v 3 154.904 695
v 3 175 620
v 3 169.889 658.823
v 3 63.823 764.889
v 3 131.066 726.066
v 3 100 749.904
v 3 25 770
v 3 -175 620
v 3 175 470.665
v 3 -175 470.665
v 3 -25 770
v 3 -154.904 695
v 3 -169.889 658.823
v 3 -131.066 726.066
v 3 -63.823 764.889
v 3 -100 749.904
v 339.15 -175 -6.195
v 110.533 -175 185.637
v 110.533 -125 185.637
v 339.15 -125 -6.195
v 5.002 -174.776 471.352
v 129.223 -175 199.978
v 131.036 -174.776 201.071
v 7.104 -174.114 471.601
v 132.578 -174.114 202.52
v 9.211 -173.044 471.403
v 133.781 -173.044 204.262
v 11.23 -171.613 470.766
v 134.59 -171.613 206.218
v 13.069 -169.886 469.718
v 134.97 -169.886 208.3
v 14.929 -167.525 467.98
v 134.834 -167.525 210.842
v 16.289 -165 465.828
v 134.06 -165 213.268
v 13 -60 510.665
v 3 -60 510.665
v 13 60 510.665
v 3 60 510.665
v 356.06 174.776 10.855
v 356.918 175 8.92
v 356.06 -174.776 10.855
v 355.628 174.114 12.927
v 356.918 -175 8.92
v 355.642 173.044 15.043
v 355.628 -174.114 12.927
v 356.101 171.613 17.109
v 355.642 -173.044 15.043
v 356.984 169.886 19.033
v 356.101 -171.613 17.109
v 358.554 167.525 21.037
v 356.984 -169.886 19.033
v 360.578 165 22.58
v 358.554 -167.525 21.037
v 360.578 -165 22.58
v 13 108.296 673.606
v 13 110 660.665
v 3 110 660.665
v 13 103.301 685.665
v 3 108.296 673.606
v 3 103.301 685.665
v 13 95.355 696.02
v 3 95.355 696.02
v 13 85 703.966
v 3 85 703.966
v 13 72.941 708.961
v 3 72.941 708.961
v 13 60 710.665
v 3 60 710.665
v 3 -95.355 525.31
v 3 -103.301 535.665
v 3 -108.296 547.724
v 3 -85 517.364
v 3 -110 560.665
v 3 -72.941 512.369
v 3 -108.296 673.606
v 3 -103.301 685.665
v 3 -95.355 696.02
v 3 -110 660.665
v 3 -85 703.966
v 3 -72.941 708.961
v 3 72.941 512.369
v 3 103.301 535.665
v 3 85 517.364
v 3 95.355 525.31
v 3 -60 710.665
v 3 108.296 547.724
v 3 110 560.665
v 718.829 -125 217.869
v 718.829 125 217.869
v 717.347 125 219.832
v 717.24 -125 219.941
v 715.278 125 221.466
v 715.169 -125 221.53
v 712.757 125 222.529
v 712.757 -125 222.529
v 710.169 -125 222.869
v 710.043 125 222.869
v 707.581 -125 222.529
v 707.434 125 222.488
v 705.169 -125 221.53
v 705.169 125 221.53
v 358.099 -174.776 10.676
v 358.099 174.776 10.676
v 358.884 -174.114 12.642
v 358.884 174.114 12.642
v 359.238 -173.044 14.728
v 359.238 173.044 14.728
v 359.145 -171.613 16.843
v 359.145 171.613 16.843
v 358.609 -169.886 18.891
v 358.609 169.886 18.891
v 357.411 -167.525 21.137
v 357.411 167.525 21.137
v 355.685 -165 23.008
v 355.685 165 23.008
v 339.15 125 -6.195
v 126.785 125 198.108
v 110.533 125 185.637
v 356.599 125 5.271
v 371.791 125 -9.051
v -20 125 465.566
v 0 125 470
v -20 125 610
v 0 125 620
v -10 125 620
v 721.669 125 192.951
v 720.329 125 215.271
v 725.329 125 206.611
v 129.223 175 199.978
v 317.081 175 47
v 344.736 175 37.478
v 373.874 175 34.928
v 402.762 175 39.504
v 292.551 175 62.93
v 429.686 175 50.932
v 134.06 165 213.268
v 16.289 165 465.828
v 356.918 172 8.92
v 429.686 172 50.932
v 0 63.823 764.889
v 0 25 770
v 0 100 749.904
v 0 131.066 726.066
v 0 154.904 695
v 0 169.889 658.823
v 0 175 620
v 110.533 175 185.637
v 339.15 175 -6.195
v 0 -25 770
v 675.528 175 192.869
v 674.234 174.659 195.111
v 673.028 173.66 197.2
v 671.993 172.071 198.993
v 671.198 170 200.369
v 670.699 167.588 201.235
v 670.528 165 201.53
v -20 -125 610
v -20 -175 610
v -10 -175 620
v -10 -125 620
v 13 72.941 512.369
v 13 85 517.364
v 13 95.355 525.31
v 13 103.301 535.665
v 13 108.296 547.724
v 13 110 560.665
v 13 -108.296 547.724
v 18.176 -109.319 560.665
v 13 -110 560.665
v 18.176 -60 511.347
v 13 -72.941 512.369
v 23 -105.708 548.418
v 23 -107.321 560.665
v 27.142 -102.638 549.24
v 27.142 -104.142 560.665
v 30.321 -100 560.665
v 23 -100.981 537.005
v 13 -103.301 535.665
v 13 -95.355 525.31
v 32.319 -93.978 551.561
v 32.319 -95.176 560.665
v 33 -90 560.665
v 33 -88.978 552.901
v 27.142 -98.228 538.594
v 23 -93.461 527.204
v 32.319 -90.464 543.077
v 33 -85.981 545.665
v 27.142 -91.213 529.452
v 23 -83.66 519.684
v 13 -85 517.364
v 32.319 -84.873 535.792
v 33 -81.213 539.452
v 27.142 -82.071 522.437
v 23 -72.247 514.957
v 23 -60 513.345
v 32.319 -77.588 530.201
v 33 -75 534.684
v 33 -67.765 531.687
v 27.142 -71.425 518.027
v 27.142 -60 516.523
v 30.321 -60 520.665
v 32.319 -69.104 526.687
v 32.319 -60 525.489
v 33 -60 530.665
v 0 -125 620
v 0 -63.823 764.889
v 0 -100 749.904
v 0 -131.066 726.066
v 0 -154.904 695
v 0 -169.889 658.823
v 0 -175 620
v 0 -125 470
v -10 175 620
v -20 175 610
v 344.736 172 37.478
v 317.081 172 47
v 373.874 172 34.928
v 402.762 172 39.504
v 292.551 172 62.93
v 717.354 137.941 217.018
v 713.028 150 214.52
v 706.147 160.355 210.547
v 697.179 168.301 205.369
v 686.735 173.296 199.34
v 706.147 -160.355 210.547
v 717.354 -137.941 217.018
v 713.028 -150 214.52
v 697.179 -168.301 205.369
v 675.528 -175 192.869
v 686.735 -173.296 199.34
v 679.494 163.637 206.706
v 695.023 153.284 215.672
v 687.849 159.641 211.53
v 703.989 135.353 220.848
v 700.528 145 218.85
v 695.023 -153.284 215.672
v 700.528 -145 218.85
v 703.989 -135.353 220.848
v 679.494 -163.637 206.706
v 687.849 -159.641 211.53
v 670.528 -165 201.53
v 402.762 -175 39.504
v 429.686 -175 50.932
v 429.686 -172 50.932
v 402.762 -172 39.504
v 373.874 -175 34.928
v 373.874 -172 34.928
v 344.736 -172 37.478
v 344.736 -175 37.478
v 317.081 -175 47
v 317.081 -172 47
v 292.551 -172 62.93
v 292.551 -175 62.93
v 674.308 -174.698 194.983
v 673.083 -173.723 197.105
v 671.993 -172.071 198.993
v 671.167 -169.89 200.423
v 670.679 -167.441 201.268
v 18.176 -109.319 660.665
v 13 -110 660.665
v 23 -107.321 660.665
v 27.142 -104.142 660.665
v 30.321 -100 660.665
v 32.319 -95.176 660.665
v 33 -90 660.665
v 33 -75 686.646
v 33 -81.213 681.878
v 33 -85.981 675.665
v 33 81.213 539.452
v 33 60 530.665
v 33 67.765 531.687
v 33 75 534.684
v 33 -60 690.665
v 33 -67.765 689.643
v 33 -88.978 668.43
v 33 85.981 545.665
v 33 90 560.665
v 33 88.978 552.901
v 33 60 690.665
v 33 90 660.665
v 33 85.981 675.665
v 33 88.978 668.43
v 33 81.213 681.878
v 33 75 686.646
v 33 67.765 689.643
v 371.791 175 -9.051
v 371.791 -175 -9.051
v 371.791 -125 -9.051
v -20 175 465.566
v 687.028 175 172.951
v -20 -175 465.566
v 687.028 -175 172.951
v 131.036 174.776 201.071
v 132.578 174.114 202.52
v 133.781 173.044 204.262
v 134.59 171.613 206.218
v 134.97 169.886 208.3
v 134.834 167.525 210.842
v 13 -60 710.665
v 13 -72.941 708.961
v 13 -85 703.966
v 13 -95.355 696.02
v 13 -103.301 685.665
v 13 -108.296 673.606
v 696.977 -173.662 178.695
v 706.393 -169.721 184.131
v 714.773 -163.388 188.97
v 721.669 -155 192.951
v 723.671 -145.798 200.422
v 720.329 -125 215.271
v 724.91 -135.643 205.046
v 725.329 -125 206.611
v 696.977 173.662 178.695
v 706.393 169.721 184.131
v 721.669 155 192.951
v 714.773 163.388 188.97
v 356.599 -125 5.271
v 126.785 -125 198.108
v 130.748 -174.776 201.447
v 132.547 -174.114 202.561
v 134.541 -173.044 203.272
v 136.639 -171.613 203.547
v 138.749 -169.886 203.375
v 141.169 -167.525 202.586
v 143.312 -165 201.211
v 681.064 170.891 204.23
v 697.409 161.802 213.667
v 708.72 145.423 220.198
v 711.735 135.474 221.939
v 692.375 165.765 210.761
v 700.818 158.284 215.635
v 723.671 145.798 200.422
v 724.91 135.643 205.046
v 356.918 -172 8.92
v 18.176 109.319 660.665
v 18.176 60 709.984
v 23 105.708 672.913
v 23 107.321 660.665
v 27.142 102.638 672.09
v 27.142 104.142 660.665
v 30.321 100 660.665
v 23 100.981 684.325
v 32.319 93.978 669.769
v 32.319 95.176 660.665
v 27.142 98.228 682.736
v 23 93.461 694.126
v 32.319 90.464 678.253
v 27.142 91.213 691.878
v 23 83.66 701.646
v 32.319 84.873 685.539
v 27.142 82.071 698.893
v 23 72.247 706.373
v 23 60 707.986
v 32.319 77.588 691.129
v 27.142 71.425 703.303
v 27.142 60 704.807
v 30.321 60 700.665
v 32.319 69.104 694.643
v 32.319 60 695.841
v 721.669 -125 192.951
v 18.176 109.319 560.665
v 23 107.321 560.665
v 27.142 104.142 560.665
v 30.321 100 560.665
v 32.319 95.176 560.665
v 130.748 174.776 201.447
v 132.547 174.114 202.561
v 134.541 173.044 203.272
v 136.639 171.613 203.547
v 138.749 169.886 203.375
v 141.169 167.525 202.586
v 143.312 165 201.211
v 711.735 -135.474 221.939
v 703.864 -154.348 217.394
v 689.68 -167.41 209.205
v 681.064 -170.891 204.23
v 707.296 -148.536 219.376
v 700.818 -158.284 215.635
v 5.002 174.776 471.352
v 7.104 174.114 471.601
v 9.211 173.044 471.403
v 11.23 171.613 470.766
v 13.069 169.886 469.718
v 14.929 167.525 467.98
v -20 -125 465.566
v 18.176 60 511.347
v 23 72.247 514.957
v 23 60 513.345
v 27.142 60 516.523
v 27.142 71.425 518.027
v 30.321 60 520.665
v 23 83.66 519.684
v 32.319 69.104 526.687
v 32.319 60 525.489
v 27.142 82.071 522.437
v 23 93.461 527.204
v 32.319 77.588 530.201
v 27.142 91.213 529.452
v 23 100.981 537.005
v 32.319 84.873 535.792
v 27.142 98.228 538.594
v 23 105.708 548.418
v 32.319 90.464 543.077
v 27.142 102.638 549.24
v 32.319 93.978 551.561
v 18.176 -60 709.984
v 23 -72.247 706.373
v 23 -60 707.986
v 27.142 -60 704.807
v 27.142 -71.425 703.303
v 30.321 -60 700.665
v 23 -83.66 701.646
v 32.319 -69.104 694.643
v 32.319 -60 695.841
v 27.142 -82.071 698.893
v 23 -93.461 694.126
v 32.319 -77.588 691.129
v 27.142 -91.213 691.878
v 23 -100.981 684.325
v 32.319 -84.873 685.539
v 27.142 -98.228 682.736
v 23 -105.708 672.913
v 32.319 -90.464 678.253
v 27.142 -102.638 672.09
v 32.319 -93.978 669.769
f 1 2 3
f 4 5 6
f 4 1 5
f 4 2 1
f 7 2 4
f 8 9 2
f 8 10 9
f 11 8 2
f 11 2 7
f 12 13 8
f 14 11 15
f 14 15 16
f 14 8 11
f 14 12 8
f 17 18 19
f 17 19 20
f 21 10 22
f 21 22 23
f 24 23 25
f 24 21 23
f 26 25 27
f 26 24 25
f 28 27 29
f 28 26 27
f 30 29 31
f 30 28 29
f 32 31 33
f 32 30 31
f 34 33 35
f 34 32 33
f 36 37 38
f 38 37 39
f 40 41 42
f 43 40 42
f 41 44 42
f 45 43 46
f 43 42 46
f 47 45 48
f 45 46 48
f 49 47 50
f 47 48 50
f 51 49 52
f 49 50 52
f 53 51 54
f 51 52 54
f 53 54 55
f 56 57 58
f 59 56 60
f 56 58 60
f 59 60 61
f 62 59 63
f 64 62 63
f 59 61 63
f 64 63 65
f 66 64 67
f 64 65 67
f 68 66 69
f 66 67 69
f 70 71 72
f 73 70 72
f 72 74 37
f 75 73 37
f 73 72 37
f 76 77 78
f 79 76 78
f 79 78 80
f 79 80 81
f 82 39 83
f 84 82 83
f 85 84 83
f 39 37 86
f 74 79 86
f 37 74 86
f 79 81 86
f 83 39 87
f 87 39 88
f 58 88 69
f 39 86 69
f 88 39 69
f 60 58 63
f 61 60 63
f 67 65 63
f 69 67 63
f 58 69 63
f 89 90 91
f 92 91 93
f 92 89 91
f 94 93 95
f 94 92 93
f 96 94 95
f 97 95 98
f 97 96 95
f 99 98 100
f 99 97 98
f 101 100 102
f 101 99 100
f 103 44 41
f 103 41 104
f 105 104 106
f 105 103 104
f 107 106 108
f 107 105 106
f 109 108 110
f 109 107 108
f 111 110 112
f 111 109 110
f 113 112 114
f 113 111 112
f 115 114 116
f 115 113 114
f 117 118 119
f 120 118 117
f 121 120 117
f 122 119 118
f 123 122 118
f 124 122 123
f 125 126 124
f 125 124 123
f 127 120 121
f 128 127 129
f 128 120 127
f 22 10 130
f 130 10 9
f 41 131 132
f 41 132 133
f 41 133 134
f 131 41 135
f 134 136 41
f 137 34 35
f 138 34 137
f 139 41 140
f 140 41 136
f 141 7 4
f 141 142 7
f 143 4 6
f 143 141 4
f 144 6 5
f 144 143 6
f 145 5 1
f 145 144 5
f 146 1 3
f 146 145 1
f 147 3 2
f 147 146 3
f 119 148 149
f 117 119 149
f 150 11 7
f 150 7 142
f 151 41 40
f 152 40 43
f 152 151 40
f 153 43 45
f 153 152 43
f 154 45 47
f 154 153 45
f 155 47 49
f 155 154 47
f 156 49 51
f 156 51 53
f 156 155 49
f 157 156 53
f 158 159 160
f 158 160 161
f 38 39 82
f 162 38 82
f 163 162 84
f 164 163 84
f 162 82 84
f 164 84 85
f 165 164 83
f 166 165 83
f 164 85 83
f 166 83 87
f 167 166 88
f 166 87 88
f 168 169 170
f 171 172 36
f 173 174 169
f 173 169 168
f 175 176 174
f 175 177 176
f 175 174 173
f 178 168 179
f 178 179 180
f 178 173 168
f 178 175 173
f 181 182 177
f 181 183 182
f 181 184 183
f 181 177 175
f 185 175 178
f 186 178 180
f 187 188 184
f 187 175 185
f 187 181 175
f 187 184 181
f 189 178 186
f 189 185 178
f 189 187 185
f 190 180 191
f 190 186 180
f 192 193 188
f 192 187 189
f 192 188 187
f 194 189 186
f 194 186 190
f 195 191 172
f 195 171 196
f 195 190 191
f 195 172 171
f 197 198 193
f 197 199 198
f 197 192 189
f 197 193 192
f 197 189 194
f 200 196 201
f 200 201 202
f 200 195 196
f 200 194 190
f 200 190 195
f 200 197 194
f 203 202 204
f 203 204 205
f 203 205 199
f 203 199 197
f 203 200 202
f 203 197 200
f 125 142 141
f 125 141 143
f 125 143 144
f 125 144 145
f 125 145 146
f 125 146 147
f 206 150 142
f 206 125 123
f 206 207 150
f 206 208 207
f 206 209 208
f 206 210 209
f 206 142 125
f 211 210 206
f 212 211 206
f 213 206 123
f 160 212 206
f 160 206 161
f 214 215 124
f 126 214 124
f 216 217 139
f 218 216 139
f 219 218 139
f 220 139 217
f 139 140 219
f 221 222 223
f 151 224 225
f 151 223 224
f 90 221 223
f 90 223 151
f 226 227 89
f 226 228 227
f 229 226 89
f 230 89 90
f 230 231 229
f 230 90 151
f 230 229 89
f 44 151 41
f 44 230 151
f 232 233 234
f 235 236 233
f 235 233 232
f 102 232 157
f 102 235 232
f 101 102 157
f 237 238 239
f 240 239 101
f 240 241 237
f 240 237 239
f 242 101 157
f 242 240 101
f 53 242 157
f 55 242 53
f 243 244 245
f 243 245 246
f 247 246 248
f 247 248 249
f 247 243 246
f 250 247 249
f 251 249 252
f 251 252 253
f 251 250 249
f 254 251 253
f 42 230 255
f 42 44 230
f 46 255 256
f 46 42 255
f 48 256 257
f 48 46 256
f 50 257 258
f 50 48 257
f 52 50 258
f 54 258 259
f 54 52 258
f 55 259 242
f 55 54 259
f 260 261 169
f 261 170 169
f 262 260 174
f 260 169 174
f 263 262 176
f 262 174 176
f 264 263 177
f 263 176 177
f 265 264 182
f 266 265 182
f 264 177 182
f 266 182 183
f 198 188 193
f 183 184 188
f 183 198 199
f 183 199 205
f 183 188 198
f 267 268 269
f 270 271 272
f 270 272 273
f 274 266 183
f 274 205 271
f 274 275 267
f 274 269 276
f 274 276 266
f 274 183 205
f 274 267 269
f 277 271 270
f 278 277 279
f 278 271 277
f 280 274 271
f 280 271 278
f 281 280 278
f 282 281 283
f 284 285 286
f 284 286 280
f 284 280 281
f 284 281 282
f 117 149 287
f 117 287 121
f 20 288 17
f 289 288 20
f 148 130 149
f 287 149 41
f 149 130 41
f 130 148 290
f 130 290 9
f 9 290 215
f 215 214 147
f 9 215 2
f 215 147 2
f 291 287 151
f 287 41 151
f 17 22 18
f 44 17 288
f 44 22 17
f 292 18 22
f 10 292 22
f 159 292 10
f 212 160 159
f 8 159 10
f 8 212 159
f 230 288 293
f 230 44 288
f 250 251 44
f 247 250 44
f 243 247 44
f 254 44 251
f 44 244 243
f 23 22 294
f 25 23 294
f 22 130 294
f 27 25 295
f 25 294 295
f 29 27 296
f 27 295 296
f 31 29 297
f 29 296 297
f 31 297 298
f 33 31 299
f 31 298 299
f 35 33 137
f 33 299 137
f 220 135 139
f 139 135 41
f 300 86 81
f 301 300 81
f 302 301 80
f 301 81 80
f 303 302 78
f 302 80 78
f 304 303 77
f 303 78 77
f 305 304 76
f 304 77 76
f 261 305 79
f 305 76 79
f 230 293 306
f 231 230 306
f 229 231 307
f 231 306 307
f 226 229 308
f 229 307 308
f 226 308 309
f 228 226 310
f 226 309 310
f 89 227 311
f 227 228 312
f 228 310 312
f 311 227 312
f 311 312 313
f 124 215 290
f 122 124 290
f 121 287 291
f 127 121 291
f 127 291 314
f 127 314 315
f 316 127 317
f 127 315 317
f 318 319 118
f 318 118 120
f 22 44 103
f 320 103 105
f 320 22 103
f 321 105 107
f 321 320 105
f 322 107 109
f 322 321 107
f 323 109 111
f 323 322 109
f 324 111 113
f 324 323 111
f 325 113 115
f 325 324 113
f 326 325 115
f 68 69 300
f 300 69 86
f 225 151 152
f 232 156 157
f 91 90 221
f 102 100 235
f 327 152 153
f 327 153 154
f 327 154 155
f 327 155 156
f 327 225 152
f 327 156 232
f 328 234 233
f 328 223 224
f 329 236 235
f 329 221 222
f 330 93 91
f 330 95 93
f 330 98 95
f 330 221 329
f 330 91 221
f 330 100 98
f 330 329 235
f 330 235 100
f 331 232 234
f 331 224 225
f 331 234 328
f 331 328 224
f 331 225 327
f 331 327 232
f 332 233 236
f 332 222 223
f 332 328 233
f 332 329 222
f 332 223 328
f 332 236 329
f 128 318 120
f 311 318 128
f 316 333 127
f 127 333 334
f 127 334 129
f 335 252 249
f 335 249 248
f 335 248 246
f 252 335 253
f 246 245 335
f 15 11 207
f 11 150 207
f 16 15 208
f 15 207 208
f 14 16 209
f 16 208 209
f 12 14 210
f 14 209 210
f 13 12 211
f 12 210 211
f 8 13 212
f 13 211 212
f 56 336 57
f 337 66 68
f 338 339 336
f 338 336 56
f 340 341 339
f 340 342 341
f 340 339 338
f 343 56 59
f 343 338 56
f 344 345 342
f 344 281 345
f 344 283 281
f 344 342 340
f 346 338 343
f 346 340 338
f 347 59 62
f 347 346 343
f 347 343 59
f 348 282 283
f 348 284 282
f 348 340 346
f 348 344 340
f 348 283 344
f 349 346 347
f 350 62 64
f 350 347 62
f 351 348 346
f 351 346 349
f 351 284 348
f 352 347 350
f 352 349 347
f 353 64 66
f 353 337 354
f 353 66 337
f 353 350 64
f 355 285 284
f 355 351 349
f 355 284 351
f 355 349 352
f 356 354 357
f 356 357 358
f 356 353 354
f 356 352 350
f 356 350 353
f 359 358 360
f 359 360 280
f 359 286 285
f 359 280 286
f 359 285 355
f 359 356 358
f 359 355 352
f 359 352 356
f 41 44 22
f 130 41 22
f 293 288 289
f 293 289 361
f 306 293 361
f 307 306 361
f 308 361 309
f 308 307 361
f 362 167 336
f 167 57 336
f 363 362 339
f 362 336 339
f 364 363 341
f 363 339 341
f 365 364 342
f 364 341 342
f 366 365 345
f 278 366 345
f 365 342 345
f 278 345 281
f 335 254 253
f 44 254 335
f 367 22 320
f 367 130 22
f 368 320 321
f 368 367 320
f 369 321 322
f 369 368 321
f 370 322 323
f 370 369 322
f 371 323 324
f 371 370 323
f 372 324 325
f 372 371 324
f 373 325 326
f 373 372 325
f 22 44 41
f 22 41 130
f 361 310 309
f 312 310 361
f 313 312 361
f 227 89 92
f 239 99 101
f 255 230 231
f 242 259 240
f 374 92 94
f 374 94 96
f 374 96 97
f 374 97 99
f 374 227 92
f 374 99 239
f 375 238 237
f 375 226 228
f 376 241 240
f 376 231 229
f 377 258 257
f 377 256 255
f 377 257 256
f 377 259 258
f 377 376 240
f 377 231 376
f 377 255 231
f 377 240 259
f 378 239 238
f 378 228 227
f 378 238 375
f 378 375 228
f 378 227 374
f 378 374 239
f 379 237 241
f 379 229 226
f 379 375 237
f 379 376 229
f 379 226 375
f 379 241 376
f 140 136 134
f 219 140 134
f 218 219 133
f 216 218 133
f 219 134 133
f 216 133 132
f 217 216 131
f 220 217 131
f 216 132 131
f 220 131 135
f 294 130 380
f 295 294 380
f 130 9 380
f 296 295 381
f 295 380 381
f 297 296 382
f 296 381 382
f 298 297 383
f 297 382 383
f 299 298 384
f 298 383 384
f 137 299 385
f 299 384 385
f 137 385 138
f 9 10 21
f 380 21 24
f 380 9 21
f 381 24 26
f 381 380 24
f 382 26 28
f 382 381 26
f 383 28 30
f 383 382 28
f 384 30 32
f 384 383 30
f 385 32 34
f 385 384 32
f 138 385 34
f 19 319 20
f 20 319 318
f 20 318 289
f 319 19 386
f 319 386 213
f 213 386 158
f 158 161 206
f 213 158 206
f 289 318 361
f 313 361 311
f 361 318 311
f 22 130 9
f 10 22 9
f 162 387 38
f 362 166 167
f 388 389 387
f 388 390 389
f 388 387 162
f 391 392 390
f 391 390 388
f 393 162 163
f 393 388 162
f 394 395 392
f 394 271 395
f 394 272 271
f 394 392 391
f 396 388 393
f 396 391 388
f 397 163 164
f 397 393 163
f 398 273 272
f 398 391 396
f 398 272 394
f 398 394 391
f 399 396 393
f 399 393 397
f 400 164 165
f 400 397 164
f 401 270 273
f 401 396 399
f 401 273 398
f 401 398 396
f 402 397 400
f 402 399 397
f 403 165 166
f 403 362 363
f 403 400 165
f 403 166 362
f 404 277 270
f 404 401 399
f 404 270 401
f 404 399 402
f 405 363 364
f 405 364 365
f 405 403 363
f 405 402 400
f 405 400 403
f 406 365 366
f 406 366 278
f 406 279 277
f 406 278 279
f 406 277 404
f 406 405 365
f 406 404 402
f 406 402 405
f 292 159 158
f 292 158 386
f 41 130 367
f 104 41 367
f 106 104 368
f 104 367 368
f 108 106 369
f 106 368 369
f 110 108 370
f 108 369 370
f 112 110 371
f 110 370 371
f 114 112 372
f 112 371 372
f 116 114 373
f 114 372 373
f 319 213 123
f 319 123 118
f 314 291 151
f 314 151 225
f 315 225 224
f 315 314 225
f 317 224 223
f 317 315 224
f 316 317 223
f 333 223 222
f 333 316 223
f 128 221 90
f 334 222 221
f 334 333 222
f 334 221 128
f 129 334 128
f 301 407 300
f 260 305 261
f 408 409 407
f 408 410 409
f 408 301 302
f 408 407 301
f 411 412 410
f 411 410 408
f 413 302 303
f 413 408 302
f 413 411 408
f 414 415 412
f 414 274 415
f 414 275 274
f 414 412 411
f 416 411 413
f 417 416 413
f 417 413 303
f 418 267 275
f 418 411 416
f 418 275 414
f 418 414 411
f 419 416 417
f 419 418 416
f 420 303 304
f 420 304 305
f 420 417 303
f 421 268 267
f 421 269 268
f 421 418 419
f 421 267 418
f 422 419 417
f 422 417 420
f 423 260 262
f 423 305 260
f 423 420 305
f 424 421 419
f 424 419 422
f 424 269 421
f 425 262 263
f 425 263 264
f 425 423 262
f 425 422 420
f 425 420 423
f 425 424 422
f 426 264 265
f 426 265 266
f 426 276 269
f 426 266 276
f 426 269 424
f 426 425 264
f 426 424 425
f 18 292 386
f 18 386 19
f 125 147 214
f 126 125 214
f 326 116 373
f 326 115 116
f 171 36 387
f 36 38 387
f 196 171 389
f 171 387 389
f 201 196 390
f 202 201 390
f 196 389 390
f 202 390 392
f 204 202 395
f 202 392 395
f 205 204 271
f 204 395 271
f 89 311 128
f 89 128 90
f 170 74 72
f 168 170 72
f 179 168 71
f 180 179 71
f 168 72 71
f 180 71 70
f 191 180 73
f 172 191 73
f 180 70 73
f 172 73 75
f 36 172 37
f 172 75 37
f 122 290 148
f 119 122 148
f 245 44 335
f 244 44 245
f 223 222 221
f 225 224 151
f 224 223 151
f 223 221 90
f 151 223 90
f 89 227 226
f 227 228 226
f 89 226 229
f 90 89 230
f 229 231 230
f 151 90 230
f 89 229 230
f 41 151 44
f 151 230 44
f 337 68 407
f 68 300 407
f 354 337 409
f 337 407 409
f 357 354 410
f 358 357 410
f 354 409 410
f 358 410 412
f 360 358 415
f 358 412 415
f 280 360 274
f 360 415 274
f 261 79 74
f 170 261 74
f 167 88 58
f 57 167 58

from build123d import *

# Parameters (mm, degrees)
F1_DEPTH     = 175
F2_R         = 150
F4_DEPTH     = 3
F7_DEPTH     = 50
F8_SIZE      = 10
F10_T1_DEPTH = 263
F12_DEPTH    = 30
F13_R        = 20
F14_W        = 350
F14_H        = 298.6698320241
F15_DEPTH    = 10
F16_R        = 9.99999
F17_DEPTH    = 10
F18_R        = 9.99999
F19_DEPTH    = 10
F20_R        = 9.99999
F21_SIZE     = 20


# Not quite as in the source:
# - a fillet or chamfer that OpenCascade refuses, or shapes differently, is made with other operations: its cross-section is extruded or revolved along the edge and cut away or added
# - a fillet or chamfer is up to 0.001 mm smaller than in the source, because OpenCascade refuses the exact size


with BuildPart() as f1:
    # F0 (on Front) → F1 (new body, symmetric)
    with BuildSketch(Plane.XZ):
        Polygon((3, 770), (0, 770), (0, 470), (126.7854785222, 198.107663889), (356.5988114579, 5.271380983), (720.3294810474, 215.271380983), (718.8294810474, 217.8694571944), (356.9180040059, 8.9197685017), (129.2233252444, 199.9782894715), (3, 470.6650839879), align=None)
    extrude(amount=F1_DEPTH, both=True)

    # F2
    f2_edges = [f1.edges().sort_by_distance(p)[0] for p in [
        (1.5, -175, 770),
        (1.5, 175, 770),
    ]]
    fillet(f2_edges, radius=F2_R)

    # F6 (on face) → F7 (join)
    with BuildSketch(Plane.XZ.offset(175)):
        Polygon((0, 470), (0, 620), (-20, 620), (-20, 465.5661067471), (110.5331670407, 185.6368266722), (354.4708611377, -19.0512024747), (730.3294810474, 197.9508729074), (720.3294810474, 215.271380983), (356.5988114579, 5.271380983), (126.7854785222, 198.107663889), align=None)
    extrude(amount=-F7_DEPTH)

    # F8
    f8_edges = [f1.edges().sort_by_distance(p)[0] for p in [
        (-20, -150, 620),
        (730.329481, -150, 197.950873),
    ]]
    chamfer(f8_edges, length=F8_SIZE)

    # F9: F1 across plane


with BuildPart() as f4:
    # F3 (on face) → F4 (new body)
    with BuildSketch(Plane.XZ.offset(175)):
        with BuildLine():
            ThreePointArc((429.6857059273, 50.9322207943), (359.2270167975, 35.3119054774), (292.5511927649, 62.9299360741))
            Line((292.5511927649, 62.9299360741), (356.9180040059, 8.9197685017))
            Line((356.9180040059, 8.9197685017), (429.6857059273, 50.9322207943))
        make_face()
    extrude(amount=-F4_DEPTH)


with BuildPart() as f5_1:
    # F5: instance of F4
    add(f4.part.mirror(Plane.XZ))


with BuildPart() as f1_1:
    add(f1.part)
    add(f1.part.mirror(Plane.XZ))

    # F10: fillet of radius 50 on 2 edges, made by hand

    # F10_s2 → F10_t1 (cut)
    with BuildSketch(Plane(origin=(154.3671279423, 0, -267.3717086146), x_dir=(0, 1, 0), z_dir=(-0.5, 0, 0.8660254038))):
        with BuildLine():
            ThreePointArc((-175, -681.4593201734), (-160.3553390593, -716.8146592327), (-125, -731.4593201734))
            Line((-125, -731.4593201734), (-175, -731.4593201734))
            Line((-175, -731.4593201734), (-175, -681.4593201734))
        make_face()
        with BuildLine():
            ThreePointArc((175, -681.4593201734), (160.3553390593, -716.8146592327), (125, -731.4593201734))
            Line((125, -731.4593201734), (175, -731.4593201734))
            Line((175, -731.4593201734), (175, -681.4593201734))
        make_face()
    extrude(amount=F10_T1_DEPTH, mode=Mode.SUBTRACT)


with BuildPart() as f12:
    # F11 (on face) → F12 (new body)
    with BuildSketch(Plane.YZ.offset(3)):
        with BuildLine():
            Line((-60, 510.6650839879), (60, 510.6650839879))
            ThreePointArc((60, 510.6650839879), (95.3553390593, 525.3097449286), (110, 560.6650839879))
            Line((110, 560.6650839879), (110, 660.6650839879))
            ThreePointArc((110, 660.6650839879), (95.3553390593, 696.0204230473), (60, 710.6650839879))
            Line((60, 710.6650839879), (-60, 710.6650839879))
            ThreePointArc((-60, 710.6650839879), (-95.3553390593, 696.0204230473), (-110, 660.6650839879))
            Line((-110, 660.6650839879), (-110, 560.6650839879))
            ThreePointArc((-110, 560.6650839879), (-95.3553390593, 525.3097449286), (-60, 510.6650839879))
        make_face()
    extrude(amount=F12_DEPTH)

    # F13
    f13_edges = [f12.edges().sort_by_distance(p)[0] for p in [
        (33, -110, 610.665084),
        (33, -95.355339, 525.309745),
        (33, 0, 510.665084),
        (33, 95.355339, 525.309745),
        (33, 110, 610.665084),
        (33, 95.355339, 696.020423),
        (33, 0, 710.665084),
        (33, -95.355339, 696.020423),
    ]]
    fillet(f13_edges, radius=F13_R)


with BuildPart() as f15:
    # F14 (on face) → F15 (new body)
    with BuildSketch(Plane(origin=(182.7393674941, 0, 85.2127665089), x_dir=(0, 1, 0), z_dir=(0.906307787, 0, 0.4226182617))):
        with Locations((0, 275.9646599072)):
            Rectangle(F14_W, F14_H)
    extrude(amount=F15_DEPTH)

    # F16 (radius 10 in the source; OpenCascade refuses exactly that, so slightly less here)
    f16_edges = [f15.edges().sort_by_distance(p)[0] for p in [
        (138.286403, 0, 204.204472),
        (75.17474, 175, 339.547869),
        (12.063078, 0, 474.891267),
        (75.17474, -175, 339.547869),
    ]]
    fillet(f16_edges, radius=F16_R)


with BuildPart() as f17:
    # F17 (new): a face of the model
    f17_faces = [f1_1.part.faces().sort_by_distance(p)[0] for p in [
        (243.0706646252, 0, 104.4490289866),
    ]]
    extrude(f17_faces, amount=F17_DEPTH)

    # F18 (radius 10 in the source; OpenCascade refuses exactly that, so slightly less here)
    f18_edges = [f17.edges().sort_by_distance(p)[0] for p in [
        (249.498541, 175, 112.109473),
        (135.651201, 0, 207.638734),
        (249.498541, -175, 112.109473),
        (363.34588, 0, 16.580213),
    ]]
    fillet(f18_edges, radius=F18_R)


with BuildPart() as f19:
    # F19 (new): a face of the model
    f19_faces = [f1_1.part.faces().sort_by_distance(p)[0] for p in [
        (536.6079070268, 0, 112.6637823815),
    ]]
    extrude(f19_faces, amount=F19_DEPTH)

    # F20 (radius 10 in the source; OpenCascade refuses exactly that, so slightly less here)
    f20_edges = [f19.edges().sort_by_distance(p)[0] for p in [
        (701.146833, 160.355339, 219.207381),
        (713.829481, 0, 226.529711),
        (701.146833, -160.355339, 219.207381),
        (511.223107, -175, 109.554867),
        (351.918004, 0, 17.580023),
        (511.223107, 175, 109.554867),
    ]]
    fillet(f20_edges, radius=F20_R)


with BuildPart() as f1_2:
    add(f1_1.part)

    # F21
    f21_edges = [f1_2.edges().sort_by_distance(p)[0] for p in [
        (354.470861, -150, -19.051202),
        (354.470861, 150, -19.051202),
    ]]
    chamfer(f21_edges, length=F21_SIZE)


solid = Compound([f4.part, f5_1.part, f12.part, f15.part, f17.part, f19.part, f1_2.part])
